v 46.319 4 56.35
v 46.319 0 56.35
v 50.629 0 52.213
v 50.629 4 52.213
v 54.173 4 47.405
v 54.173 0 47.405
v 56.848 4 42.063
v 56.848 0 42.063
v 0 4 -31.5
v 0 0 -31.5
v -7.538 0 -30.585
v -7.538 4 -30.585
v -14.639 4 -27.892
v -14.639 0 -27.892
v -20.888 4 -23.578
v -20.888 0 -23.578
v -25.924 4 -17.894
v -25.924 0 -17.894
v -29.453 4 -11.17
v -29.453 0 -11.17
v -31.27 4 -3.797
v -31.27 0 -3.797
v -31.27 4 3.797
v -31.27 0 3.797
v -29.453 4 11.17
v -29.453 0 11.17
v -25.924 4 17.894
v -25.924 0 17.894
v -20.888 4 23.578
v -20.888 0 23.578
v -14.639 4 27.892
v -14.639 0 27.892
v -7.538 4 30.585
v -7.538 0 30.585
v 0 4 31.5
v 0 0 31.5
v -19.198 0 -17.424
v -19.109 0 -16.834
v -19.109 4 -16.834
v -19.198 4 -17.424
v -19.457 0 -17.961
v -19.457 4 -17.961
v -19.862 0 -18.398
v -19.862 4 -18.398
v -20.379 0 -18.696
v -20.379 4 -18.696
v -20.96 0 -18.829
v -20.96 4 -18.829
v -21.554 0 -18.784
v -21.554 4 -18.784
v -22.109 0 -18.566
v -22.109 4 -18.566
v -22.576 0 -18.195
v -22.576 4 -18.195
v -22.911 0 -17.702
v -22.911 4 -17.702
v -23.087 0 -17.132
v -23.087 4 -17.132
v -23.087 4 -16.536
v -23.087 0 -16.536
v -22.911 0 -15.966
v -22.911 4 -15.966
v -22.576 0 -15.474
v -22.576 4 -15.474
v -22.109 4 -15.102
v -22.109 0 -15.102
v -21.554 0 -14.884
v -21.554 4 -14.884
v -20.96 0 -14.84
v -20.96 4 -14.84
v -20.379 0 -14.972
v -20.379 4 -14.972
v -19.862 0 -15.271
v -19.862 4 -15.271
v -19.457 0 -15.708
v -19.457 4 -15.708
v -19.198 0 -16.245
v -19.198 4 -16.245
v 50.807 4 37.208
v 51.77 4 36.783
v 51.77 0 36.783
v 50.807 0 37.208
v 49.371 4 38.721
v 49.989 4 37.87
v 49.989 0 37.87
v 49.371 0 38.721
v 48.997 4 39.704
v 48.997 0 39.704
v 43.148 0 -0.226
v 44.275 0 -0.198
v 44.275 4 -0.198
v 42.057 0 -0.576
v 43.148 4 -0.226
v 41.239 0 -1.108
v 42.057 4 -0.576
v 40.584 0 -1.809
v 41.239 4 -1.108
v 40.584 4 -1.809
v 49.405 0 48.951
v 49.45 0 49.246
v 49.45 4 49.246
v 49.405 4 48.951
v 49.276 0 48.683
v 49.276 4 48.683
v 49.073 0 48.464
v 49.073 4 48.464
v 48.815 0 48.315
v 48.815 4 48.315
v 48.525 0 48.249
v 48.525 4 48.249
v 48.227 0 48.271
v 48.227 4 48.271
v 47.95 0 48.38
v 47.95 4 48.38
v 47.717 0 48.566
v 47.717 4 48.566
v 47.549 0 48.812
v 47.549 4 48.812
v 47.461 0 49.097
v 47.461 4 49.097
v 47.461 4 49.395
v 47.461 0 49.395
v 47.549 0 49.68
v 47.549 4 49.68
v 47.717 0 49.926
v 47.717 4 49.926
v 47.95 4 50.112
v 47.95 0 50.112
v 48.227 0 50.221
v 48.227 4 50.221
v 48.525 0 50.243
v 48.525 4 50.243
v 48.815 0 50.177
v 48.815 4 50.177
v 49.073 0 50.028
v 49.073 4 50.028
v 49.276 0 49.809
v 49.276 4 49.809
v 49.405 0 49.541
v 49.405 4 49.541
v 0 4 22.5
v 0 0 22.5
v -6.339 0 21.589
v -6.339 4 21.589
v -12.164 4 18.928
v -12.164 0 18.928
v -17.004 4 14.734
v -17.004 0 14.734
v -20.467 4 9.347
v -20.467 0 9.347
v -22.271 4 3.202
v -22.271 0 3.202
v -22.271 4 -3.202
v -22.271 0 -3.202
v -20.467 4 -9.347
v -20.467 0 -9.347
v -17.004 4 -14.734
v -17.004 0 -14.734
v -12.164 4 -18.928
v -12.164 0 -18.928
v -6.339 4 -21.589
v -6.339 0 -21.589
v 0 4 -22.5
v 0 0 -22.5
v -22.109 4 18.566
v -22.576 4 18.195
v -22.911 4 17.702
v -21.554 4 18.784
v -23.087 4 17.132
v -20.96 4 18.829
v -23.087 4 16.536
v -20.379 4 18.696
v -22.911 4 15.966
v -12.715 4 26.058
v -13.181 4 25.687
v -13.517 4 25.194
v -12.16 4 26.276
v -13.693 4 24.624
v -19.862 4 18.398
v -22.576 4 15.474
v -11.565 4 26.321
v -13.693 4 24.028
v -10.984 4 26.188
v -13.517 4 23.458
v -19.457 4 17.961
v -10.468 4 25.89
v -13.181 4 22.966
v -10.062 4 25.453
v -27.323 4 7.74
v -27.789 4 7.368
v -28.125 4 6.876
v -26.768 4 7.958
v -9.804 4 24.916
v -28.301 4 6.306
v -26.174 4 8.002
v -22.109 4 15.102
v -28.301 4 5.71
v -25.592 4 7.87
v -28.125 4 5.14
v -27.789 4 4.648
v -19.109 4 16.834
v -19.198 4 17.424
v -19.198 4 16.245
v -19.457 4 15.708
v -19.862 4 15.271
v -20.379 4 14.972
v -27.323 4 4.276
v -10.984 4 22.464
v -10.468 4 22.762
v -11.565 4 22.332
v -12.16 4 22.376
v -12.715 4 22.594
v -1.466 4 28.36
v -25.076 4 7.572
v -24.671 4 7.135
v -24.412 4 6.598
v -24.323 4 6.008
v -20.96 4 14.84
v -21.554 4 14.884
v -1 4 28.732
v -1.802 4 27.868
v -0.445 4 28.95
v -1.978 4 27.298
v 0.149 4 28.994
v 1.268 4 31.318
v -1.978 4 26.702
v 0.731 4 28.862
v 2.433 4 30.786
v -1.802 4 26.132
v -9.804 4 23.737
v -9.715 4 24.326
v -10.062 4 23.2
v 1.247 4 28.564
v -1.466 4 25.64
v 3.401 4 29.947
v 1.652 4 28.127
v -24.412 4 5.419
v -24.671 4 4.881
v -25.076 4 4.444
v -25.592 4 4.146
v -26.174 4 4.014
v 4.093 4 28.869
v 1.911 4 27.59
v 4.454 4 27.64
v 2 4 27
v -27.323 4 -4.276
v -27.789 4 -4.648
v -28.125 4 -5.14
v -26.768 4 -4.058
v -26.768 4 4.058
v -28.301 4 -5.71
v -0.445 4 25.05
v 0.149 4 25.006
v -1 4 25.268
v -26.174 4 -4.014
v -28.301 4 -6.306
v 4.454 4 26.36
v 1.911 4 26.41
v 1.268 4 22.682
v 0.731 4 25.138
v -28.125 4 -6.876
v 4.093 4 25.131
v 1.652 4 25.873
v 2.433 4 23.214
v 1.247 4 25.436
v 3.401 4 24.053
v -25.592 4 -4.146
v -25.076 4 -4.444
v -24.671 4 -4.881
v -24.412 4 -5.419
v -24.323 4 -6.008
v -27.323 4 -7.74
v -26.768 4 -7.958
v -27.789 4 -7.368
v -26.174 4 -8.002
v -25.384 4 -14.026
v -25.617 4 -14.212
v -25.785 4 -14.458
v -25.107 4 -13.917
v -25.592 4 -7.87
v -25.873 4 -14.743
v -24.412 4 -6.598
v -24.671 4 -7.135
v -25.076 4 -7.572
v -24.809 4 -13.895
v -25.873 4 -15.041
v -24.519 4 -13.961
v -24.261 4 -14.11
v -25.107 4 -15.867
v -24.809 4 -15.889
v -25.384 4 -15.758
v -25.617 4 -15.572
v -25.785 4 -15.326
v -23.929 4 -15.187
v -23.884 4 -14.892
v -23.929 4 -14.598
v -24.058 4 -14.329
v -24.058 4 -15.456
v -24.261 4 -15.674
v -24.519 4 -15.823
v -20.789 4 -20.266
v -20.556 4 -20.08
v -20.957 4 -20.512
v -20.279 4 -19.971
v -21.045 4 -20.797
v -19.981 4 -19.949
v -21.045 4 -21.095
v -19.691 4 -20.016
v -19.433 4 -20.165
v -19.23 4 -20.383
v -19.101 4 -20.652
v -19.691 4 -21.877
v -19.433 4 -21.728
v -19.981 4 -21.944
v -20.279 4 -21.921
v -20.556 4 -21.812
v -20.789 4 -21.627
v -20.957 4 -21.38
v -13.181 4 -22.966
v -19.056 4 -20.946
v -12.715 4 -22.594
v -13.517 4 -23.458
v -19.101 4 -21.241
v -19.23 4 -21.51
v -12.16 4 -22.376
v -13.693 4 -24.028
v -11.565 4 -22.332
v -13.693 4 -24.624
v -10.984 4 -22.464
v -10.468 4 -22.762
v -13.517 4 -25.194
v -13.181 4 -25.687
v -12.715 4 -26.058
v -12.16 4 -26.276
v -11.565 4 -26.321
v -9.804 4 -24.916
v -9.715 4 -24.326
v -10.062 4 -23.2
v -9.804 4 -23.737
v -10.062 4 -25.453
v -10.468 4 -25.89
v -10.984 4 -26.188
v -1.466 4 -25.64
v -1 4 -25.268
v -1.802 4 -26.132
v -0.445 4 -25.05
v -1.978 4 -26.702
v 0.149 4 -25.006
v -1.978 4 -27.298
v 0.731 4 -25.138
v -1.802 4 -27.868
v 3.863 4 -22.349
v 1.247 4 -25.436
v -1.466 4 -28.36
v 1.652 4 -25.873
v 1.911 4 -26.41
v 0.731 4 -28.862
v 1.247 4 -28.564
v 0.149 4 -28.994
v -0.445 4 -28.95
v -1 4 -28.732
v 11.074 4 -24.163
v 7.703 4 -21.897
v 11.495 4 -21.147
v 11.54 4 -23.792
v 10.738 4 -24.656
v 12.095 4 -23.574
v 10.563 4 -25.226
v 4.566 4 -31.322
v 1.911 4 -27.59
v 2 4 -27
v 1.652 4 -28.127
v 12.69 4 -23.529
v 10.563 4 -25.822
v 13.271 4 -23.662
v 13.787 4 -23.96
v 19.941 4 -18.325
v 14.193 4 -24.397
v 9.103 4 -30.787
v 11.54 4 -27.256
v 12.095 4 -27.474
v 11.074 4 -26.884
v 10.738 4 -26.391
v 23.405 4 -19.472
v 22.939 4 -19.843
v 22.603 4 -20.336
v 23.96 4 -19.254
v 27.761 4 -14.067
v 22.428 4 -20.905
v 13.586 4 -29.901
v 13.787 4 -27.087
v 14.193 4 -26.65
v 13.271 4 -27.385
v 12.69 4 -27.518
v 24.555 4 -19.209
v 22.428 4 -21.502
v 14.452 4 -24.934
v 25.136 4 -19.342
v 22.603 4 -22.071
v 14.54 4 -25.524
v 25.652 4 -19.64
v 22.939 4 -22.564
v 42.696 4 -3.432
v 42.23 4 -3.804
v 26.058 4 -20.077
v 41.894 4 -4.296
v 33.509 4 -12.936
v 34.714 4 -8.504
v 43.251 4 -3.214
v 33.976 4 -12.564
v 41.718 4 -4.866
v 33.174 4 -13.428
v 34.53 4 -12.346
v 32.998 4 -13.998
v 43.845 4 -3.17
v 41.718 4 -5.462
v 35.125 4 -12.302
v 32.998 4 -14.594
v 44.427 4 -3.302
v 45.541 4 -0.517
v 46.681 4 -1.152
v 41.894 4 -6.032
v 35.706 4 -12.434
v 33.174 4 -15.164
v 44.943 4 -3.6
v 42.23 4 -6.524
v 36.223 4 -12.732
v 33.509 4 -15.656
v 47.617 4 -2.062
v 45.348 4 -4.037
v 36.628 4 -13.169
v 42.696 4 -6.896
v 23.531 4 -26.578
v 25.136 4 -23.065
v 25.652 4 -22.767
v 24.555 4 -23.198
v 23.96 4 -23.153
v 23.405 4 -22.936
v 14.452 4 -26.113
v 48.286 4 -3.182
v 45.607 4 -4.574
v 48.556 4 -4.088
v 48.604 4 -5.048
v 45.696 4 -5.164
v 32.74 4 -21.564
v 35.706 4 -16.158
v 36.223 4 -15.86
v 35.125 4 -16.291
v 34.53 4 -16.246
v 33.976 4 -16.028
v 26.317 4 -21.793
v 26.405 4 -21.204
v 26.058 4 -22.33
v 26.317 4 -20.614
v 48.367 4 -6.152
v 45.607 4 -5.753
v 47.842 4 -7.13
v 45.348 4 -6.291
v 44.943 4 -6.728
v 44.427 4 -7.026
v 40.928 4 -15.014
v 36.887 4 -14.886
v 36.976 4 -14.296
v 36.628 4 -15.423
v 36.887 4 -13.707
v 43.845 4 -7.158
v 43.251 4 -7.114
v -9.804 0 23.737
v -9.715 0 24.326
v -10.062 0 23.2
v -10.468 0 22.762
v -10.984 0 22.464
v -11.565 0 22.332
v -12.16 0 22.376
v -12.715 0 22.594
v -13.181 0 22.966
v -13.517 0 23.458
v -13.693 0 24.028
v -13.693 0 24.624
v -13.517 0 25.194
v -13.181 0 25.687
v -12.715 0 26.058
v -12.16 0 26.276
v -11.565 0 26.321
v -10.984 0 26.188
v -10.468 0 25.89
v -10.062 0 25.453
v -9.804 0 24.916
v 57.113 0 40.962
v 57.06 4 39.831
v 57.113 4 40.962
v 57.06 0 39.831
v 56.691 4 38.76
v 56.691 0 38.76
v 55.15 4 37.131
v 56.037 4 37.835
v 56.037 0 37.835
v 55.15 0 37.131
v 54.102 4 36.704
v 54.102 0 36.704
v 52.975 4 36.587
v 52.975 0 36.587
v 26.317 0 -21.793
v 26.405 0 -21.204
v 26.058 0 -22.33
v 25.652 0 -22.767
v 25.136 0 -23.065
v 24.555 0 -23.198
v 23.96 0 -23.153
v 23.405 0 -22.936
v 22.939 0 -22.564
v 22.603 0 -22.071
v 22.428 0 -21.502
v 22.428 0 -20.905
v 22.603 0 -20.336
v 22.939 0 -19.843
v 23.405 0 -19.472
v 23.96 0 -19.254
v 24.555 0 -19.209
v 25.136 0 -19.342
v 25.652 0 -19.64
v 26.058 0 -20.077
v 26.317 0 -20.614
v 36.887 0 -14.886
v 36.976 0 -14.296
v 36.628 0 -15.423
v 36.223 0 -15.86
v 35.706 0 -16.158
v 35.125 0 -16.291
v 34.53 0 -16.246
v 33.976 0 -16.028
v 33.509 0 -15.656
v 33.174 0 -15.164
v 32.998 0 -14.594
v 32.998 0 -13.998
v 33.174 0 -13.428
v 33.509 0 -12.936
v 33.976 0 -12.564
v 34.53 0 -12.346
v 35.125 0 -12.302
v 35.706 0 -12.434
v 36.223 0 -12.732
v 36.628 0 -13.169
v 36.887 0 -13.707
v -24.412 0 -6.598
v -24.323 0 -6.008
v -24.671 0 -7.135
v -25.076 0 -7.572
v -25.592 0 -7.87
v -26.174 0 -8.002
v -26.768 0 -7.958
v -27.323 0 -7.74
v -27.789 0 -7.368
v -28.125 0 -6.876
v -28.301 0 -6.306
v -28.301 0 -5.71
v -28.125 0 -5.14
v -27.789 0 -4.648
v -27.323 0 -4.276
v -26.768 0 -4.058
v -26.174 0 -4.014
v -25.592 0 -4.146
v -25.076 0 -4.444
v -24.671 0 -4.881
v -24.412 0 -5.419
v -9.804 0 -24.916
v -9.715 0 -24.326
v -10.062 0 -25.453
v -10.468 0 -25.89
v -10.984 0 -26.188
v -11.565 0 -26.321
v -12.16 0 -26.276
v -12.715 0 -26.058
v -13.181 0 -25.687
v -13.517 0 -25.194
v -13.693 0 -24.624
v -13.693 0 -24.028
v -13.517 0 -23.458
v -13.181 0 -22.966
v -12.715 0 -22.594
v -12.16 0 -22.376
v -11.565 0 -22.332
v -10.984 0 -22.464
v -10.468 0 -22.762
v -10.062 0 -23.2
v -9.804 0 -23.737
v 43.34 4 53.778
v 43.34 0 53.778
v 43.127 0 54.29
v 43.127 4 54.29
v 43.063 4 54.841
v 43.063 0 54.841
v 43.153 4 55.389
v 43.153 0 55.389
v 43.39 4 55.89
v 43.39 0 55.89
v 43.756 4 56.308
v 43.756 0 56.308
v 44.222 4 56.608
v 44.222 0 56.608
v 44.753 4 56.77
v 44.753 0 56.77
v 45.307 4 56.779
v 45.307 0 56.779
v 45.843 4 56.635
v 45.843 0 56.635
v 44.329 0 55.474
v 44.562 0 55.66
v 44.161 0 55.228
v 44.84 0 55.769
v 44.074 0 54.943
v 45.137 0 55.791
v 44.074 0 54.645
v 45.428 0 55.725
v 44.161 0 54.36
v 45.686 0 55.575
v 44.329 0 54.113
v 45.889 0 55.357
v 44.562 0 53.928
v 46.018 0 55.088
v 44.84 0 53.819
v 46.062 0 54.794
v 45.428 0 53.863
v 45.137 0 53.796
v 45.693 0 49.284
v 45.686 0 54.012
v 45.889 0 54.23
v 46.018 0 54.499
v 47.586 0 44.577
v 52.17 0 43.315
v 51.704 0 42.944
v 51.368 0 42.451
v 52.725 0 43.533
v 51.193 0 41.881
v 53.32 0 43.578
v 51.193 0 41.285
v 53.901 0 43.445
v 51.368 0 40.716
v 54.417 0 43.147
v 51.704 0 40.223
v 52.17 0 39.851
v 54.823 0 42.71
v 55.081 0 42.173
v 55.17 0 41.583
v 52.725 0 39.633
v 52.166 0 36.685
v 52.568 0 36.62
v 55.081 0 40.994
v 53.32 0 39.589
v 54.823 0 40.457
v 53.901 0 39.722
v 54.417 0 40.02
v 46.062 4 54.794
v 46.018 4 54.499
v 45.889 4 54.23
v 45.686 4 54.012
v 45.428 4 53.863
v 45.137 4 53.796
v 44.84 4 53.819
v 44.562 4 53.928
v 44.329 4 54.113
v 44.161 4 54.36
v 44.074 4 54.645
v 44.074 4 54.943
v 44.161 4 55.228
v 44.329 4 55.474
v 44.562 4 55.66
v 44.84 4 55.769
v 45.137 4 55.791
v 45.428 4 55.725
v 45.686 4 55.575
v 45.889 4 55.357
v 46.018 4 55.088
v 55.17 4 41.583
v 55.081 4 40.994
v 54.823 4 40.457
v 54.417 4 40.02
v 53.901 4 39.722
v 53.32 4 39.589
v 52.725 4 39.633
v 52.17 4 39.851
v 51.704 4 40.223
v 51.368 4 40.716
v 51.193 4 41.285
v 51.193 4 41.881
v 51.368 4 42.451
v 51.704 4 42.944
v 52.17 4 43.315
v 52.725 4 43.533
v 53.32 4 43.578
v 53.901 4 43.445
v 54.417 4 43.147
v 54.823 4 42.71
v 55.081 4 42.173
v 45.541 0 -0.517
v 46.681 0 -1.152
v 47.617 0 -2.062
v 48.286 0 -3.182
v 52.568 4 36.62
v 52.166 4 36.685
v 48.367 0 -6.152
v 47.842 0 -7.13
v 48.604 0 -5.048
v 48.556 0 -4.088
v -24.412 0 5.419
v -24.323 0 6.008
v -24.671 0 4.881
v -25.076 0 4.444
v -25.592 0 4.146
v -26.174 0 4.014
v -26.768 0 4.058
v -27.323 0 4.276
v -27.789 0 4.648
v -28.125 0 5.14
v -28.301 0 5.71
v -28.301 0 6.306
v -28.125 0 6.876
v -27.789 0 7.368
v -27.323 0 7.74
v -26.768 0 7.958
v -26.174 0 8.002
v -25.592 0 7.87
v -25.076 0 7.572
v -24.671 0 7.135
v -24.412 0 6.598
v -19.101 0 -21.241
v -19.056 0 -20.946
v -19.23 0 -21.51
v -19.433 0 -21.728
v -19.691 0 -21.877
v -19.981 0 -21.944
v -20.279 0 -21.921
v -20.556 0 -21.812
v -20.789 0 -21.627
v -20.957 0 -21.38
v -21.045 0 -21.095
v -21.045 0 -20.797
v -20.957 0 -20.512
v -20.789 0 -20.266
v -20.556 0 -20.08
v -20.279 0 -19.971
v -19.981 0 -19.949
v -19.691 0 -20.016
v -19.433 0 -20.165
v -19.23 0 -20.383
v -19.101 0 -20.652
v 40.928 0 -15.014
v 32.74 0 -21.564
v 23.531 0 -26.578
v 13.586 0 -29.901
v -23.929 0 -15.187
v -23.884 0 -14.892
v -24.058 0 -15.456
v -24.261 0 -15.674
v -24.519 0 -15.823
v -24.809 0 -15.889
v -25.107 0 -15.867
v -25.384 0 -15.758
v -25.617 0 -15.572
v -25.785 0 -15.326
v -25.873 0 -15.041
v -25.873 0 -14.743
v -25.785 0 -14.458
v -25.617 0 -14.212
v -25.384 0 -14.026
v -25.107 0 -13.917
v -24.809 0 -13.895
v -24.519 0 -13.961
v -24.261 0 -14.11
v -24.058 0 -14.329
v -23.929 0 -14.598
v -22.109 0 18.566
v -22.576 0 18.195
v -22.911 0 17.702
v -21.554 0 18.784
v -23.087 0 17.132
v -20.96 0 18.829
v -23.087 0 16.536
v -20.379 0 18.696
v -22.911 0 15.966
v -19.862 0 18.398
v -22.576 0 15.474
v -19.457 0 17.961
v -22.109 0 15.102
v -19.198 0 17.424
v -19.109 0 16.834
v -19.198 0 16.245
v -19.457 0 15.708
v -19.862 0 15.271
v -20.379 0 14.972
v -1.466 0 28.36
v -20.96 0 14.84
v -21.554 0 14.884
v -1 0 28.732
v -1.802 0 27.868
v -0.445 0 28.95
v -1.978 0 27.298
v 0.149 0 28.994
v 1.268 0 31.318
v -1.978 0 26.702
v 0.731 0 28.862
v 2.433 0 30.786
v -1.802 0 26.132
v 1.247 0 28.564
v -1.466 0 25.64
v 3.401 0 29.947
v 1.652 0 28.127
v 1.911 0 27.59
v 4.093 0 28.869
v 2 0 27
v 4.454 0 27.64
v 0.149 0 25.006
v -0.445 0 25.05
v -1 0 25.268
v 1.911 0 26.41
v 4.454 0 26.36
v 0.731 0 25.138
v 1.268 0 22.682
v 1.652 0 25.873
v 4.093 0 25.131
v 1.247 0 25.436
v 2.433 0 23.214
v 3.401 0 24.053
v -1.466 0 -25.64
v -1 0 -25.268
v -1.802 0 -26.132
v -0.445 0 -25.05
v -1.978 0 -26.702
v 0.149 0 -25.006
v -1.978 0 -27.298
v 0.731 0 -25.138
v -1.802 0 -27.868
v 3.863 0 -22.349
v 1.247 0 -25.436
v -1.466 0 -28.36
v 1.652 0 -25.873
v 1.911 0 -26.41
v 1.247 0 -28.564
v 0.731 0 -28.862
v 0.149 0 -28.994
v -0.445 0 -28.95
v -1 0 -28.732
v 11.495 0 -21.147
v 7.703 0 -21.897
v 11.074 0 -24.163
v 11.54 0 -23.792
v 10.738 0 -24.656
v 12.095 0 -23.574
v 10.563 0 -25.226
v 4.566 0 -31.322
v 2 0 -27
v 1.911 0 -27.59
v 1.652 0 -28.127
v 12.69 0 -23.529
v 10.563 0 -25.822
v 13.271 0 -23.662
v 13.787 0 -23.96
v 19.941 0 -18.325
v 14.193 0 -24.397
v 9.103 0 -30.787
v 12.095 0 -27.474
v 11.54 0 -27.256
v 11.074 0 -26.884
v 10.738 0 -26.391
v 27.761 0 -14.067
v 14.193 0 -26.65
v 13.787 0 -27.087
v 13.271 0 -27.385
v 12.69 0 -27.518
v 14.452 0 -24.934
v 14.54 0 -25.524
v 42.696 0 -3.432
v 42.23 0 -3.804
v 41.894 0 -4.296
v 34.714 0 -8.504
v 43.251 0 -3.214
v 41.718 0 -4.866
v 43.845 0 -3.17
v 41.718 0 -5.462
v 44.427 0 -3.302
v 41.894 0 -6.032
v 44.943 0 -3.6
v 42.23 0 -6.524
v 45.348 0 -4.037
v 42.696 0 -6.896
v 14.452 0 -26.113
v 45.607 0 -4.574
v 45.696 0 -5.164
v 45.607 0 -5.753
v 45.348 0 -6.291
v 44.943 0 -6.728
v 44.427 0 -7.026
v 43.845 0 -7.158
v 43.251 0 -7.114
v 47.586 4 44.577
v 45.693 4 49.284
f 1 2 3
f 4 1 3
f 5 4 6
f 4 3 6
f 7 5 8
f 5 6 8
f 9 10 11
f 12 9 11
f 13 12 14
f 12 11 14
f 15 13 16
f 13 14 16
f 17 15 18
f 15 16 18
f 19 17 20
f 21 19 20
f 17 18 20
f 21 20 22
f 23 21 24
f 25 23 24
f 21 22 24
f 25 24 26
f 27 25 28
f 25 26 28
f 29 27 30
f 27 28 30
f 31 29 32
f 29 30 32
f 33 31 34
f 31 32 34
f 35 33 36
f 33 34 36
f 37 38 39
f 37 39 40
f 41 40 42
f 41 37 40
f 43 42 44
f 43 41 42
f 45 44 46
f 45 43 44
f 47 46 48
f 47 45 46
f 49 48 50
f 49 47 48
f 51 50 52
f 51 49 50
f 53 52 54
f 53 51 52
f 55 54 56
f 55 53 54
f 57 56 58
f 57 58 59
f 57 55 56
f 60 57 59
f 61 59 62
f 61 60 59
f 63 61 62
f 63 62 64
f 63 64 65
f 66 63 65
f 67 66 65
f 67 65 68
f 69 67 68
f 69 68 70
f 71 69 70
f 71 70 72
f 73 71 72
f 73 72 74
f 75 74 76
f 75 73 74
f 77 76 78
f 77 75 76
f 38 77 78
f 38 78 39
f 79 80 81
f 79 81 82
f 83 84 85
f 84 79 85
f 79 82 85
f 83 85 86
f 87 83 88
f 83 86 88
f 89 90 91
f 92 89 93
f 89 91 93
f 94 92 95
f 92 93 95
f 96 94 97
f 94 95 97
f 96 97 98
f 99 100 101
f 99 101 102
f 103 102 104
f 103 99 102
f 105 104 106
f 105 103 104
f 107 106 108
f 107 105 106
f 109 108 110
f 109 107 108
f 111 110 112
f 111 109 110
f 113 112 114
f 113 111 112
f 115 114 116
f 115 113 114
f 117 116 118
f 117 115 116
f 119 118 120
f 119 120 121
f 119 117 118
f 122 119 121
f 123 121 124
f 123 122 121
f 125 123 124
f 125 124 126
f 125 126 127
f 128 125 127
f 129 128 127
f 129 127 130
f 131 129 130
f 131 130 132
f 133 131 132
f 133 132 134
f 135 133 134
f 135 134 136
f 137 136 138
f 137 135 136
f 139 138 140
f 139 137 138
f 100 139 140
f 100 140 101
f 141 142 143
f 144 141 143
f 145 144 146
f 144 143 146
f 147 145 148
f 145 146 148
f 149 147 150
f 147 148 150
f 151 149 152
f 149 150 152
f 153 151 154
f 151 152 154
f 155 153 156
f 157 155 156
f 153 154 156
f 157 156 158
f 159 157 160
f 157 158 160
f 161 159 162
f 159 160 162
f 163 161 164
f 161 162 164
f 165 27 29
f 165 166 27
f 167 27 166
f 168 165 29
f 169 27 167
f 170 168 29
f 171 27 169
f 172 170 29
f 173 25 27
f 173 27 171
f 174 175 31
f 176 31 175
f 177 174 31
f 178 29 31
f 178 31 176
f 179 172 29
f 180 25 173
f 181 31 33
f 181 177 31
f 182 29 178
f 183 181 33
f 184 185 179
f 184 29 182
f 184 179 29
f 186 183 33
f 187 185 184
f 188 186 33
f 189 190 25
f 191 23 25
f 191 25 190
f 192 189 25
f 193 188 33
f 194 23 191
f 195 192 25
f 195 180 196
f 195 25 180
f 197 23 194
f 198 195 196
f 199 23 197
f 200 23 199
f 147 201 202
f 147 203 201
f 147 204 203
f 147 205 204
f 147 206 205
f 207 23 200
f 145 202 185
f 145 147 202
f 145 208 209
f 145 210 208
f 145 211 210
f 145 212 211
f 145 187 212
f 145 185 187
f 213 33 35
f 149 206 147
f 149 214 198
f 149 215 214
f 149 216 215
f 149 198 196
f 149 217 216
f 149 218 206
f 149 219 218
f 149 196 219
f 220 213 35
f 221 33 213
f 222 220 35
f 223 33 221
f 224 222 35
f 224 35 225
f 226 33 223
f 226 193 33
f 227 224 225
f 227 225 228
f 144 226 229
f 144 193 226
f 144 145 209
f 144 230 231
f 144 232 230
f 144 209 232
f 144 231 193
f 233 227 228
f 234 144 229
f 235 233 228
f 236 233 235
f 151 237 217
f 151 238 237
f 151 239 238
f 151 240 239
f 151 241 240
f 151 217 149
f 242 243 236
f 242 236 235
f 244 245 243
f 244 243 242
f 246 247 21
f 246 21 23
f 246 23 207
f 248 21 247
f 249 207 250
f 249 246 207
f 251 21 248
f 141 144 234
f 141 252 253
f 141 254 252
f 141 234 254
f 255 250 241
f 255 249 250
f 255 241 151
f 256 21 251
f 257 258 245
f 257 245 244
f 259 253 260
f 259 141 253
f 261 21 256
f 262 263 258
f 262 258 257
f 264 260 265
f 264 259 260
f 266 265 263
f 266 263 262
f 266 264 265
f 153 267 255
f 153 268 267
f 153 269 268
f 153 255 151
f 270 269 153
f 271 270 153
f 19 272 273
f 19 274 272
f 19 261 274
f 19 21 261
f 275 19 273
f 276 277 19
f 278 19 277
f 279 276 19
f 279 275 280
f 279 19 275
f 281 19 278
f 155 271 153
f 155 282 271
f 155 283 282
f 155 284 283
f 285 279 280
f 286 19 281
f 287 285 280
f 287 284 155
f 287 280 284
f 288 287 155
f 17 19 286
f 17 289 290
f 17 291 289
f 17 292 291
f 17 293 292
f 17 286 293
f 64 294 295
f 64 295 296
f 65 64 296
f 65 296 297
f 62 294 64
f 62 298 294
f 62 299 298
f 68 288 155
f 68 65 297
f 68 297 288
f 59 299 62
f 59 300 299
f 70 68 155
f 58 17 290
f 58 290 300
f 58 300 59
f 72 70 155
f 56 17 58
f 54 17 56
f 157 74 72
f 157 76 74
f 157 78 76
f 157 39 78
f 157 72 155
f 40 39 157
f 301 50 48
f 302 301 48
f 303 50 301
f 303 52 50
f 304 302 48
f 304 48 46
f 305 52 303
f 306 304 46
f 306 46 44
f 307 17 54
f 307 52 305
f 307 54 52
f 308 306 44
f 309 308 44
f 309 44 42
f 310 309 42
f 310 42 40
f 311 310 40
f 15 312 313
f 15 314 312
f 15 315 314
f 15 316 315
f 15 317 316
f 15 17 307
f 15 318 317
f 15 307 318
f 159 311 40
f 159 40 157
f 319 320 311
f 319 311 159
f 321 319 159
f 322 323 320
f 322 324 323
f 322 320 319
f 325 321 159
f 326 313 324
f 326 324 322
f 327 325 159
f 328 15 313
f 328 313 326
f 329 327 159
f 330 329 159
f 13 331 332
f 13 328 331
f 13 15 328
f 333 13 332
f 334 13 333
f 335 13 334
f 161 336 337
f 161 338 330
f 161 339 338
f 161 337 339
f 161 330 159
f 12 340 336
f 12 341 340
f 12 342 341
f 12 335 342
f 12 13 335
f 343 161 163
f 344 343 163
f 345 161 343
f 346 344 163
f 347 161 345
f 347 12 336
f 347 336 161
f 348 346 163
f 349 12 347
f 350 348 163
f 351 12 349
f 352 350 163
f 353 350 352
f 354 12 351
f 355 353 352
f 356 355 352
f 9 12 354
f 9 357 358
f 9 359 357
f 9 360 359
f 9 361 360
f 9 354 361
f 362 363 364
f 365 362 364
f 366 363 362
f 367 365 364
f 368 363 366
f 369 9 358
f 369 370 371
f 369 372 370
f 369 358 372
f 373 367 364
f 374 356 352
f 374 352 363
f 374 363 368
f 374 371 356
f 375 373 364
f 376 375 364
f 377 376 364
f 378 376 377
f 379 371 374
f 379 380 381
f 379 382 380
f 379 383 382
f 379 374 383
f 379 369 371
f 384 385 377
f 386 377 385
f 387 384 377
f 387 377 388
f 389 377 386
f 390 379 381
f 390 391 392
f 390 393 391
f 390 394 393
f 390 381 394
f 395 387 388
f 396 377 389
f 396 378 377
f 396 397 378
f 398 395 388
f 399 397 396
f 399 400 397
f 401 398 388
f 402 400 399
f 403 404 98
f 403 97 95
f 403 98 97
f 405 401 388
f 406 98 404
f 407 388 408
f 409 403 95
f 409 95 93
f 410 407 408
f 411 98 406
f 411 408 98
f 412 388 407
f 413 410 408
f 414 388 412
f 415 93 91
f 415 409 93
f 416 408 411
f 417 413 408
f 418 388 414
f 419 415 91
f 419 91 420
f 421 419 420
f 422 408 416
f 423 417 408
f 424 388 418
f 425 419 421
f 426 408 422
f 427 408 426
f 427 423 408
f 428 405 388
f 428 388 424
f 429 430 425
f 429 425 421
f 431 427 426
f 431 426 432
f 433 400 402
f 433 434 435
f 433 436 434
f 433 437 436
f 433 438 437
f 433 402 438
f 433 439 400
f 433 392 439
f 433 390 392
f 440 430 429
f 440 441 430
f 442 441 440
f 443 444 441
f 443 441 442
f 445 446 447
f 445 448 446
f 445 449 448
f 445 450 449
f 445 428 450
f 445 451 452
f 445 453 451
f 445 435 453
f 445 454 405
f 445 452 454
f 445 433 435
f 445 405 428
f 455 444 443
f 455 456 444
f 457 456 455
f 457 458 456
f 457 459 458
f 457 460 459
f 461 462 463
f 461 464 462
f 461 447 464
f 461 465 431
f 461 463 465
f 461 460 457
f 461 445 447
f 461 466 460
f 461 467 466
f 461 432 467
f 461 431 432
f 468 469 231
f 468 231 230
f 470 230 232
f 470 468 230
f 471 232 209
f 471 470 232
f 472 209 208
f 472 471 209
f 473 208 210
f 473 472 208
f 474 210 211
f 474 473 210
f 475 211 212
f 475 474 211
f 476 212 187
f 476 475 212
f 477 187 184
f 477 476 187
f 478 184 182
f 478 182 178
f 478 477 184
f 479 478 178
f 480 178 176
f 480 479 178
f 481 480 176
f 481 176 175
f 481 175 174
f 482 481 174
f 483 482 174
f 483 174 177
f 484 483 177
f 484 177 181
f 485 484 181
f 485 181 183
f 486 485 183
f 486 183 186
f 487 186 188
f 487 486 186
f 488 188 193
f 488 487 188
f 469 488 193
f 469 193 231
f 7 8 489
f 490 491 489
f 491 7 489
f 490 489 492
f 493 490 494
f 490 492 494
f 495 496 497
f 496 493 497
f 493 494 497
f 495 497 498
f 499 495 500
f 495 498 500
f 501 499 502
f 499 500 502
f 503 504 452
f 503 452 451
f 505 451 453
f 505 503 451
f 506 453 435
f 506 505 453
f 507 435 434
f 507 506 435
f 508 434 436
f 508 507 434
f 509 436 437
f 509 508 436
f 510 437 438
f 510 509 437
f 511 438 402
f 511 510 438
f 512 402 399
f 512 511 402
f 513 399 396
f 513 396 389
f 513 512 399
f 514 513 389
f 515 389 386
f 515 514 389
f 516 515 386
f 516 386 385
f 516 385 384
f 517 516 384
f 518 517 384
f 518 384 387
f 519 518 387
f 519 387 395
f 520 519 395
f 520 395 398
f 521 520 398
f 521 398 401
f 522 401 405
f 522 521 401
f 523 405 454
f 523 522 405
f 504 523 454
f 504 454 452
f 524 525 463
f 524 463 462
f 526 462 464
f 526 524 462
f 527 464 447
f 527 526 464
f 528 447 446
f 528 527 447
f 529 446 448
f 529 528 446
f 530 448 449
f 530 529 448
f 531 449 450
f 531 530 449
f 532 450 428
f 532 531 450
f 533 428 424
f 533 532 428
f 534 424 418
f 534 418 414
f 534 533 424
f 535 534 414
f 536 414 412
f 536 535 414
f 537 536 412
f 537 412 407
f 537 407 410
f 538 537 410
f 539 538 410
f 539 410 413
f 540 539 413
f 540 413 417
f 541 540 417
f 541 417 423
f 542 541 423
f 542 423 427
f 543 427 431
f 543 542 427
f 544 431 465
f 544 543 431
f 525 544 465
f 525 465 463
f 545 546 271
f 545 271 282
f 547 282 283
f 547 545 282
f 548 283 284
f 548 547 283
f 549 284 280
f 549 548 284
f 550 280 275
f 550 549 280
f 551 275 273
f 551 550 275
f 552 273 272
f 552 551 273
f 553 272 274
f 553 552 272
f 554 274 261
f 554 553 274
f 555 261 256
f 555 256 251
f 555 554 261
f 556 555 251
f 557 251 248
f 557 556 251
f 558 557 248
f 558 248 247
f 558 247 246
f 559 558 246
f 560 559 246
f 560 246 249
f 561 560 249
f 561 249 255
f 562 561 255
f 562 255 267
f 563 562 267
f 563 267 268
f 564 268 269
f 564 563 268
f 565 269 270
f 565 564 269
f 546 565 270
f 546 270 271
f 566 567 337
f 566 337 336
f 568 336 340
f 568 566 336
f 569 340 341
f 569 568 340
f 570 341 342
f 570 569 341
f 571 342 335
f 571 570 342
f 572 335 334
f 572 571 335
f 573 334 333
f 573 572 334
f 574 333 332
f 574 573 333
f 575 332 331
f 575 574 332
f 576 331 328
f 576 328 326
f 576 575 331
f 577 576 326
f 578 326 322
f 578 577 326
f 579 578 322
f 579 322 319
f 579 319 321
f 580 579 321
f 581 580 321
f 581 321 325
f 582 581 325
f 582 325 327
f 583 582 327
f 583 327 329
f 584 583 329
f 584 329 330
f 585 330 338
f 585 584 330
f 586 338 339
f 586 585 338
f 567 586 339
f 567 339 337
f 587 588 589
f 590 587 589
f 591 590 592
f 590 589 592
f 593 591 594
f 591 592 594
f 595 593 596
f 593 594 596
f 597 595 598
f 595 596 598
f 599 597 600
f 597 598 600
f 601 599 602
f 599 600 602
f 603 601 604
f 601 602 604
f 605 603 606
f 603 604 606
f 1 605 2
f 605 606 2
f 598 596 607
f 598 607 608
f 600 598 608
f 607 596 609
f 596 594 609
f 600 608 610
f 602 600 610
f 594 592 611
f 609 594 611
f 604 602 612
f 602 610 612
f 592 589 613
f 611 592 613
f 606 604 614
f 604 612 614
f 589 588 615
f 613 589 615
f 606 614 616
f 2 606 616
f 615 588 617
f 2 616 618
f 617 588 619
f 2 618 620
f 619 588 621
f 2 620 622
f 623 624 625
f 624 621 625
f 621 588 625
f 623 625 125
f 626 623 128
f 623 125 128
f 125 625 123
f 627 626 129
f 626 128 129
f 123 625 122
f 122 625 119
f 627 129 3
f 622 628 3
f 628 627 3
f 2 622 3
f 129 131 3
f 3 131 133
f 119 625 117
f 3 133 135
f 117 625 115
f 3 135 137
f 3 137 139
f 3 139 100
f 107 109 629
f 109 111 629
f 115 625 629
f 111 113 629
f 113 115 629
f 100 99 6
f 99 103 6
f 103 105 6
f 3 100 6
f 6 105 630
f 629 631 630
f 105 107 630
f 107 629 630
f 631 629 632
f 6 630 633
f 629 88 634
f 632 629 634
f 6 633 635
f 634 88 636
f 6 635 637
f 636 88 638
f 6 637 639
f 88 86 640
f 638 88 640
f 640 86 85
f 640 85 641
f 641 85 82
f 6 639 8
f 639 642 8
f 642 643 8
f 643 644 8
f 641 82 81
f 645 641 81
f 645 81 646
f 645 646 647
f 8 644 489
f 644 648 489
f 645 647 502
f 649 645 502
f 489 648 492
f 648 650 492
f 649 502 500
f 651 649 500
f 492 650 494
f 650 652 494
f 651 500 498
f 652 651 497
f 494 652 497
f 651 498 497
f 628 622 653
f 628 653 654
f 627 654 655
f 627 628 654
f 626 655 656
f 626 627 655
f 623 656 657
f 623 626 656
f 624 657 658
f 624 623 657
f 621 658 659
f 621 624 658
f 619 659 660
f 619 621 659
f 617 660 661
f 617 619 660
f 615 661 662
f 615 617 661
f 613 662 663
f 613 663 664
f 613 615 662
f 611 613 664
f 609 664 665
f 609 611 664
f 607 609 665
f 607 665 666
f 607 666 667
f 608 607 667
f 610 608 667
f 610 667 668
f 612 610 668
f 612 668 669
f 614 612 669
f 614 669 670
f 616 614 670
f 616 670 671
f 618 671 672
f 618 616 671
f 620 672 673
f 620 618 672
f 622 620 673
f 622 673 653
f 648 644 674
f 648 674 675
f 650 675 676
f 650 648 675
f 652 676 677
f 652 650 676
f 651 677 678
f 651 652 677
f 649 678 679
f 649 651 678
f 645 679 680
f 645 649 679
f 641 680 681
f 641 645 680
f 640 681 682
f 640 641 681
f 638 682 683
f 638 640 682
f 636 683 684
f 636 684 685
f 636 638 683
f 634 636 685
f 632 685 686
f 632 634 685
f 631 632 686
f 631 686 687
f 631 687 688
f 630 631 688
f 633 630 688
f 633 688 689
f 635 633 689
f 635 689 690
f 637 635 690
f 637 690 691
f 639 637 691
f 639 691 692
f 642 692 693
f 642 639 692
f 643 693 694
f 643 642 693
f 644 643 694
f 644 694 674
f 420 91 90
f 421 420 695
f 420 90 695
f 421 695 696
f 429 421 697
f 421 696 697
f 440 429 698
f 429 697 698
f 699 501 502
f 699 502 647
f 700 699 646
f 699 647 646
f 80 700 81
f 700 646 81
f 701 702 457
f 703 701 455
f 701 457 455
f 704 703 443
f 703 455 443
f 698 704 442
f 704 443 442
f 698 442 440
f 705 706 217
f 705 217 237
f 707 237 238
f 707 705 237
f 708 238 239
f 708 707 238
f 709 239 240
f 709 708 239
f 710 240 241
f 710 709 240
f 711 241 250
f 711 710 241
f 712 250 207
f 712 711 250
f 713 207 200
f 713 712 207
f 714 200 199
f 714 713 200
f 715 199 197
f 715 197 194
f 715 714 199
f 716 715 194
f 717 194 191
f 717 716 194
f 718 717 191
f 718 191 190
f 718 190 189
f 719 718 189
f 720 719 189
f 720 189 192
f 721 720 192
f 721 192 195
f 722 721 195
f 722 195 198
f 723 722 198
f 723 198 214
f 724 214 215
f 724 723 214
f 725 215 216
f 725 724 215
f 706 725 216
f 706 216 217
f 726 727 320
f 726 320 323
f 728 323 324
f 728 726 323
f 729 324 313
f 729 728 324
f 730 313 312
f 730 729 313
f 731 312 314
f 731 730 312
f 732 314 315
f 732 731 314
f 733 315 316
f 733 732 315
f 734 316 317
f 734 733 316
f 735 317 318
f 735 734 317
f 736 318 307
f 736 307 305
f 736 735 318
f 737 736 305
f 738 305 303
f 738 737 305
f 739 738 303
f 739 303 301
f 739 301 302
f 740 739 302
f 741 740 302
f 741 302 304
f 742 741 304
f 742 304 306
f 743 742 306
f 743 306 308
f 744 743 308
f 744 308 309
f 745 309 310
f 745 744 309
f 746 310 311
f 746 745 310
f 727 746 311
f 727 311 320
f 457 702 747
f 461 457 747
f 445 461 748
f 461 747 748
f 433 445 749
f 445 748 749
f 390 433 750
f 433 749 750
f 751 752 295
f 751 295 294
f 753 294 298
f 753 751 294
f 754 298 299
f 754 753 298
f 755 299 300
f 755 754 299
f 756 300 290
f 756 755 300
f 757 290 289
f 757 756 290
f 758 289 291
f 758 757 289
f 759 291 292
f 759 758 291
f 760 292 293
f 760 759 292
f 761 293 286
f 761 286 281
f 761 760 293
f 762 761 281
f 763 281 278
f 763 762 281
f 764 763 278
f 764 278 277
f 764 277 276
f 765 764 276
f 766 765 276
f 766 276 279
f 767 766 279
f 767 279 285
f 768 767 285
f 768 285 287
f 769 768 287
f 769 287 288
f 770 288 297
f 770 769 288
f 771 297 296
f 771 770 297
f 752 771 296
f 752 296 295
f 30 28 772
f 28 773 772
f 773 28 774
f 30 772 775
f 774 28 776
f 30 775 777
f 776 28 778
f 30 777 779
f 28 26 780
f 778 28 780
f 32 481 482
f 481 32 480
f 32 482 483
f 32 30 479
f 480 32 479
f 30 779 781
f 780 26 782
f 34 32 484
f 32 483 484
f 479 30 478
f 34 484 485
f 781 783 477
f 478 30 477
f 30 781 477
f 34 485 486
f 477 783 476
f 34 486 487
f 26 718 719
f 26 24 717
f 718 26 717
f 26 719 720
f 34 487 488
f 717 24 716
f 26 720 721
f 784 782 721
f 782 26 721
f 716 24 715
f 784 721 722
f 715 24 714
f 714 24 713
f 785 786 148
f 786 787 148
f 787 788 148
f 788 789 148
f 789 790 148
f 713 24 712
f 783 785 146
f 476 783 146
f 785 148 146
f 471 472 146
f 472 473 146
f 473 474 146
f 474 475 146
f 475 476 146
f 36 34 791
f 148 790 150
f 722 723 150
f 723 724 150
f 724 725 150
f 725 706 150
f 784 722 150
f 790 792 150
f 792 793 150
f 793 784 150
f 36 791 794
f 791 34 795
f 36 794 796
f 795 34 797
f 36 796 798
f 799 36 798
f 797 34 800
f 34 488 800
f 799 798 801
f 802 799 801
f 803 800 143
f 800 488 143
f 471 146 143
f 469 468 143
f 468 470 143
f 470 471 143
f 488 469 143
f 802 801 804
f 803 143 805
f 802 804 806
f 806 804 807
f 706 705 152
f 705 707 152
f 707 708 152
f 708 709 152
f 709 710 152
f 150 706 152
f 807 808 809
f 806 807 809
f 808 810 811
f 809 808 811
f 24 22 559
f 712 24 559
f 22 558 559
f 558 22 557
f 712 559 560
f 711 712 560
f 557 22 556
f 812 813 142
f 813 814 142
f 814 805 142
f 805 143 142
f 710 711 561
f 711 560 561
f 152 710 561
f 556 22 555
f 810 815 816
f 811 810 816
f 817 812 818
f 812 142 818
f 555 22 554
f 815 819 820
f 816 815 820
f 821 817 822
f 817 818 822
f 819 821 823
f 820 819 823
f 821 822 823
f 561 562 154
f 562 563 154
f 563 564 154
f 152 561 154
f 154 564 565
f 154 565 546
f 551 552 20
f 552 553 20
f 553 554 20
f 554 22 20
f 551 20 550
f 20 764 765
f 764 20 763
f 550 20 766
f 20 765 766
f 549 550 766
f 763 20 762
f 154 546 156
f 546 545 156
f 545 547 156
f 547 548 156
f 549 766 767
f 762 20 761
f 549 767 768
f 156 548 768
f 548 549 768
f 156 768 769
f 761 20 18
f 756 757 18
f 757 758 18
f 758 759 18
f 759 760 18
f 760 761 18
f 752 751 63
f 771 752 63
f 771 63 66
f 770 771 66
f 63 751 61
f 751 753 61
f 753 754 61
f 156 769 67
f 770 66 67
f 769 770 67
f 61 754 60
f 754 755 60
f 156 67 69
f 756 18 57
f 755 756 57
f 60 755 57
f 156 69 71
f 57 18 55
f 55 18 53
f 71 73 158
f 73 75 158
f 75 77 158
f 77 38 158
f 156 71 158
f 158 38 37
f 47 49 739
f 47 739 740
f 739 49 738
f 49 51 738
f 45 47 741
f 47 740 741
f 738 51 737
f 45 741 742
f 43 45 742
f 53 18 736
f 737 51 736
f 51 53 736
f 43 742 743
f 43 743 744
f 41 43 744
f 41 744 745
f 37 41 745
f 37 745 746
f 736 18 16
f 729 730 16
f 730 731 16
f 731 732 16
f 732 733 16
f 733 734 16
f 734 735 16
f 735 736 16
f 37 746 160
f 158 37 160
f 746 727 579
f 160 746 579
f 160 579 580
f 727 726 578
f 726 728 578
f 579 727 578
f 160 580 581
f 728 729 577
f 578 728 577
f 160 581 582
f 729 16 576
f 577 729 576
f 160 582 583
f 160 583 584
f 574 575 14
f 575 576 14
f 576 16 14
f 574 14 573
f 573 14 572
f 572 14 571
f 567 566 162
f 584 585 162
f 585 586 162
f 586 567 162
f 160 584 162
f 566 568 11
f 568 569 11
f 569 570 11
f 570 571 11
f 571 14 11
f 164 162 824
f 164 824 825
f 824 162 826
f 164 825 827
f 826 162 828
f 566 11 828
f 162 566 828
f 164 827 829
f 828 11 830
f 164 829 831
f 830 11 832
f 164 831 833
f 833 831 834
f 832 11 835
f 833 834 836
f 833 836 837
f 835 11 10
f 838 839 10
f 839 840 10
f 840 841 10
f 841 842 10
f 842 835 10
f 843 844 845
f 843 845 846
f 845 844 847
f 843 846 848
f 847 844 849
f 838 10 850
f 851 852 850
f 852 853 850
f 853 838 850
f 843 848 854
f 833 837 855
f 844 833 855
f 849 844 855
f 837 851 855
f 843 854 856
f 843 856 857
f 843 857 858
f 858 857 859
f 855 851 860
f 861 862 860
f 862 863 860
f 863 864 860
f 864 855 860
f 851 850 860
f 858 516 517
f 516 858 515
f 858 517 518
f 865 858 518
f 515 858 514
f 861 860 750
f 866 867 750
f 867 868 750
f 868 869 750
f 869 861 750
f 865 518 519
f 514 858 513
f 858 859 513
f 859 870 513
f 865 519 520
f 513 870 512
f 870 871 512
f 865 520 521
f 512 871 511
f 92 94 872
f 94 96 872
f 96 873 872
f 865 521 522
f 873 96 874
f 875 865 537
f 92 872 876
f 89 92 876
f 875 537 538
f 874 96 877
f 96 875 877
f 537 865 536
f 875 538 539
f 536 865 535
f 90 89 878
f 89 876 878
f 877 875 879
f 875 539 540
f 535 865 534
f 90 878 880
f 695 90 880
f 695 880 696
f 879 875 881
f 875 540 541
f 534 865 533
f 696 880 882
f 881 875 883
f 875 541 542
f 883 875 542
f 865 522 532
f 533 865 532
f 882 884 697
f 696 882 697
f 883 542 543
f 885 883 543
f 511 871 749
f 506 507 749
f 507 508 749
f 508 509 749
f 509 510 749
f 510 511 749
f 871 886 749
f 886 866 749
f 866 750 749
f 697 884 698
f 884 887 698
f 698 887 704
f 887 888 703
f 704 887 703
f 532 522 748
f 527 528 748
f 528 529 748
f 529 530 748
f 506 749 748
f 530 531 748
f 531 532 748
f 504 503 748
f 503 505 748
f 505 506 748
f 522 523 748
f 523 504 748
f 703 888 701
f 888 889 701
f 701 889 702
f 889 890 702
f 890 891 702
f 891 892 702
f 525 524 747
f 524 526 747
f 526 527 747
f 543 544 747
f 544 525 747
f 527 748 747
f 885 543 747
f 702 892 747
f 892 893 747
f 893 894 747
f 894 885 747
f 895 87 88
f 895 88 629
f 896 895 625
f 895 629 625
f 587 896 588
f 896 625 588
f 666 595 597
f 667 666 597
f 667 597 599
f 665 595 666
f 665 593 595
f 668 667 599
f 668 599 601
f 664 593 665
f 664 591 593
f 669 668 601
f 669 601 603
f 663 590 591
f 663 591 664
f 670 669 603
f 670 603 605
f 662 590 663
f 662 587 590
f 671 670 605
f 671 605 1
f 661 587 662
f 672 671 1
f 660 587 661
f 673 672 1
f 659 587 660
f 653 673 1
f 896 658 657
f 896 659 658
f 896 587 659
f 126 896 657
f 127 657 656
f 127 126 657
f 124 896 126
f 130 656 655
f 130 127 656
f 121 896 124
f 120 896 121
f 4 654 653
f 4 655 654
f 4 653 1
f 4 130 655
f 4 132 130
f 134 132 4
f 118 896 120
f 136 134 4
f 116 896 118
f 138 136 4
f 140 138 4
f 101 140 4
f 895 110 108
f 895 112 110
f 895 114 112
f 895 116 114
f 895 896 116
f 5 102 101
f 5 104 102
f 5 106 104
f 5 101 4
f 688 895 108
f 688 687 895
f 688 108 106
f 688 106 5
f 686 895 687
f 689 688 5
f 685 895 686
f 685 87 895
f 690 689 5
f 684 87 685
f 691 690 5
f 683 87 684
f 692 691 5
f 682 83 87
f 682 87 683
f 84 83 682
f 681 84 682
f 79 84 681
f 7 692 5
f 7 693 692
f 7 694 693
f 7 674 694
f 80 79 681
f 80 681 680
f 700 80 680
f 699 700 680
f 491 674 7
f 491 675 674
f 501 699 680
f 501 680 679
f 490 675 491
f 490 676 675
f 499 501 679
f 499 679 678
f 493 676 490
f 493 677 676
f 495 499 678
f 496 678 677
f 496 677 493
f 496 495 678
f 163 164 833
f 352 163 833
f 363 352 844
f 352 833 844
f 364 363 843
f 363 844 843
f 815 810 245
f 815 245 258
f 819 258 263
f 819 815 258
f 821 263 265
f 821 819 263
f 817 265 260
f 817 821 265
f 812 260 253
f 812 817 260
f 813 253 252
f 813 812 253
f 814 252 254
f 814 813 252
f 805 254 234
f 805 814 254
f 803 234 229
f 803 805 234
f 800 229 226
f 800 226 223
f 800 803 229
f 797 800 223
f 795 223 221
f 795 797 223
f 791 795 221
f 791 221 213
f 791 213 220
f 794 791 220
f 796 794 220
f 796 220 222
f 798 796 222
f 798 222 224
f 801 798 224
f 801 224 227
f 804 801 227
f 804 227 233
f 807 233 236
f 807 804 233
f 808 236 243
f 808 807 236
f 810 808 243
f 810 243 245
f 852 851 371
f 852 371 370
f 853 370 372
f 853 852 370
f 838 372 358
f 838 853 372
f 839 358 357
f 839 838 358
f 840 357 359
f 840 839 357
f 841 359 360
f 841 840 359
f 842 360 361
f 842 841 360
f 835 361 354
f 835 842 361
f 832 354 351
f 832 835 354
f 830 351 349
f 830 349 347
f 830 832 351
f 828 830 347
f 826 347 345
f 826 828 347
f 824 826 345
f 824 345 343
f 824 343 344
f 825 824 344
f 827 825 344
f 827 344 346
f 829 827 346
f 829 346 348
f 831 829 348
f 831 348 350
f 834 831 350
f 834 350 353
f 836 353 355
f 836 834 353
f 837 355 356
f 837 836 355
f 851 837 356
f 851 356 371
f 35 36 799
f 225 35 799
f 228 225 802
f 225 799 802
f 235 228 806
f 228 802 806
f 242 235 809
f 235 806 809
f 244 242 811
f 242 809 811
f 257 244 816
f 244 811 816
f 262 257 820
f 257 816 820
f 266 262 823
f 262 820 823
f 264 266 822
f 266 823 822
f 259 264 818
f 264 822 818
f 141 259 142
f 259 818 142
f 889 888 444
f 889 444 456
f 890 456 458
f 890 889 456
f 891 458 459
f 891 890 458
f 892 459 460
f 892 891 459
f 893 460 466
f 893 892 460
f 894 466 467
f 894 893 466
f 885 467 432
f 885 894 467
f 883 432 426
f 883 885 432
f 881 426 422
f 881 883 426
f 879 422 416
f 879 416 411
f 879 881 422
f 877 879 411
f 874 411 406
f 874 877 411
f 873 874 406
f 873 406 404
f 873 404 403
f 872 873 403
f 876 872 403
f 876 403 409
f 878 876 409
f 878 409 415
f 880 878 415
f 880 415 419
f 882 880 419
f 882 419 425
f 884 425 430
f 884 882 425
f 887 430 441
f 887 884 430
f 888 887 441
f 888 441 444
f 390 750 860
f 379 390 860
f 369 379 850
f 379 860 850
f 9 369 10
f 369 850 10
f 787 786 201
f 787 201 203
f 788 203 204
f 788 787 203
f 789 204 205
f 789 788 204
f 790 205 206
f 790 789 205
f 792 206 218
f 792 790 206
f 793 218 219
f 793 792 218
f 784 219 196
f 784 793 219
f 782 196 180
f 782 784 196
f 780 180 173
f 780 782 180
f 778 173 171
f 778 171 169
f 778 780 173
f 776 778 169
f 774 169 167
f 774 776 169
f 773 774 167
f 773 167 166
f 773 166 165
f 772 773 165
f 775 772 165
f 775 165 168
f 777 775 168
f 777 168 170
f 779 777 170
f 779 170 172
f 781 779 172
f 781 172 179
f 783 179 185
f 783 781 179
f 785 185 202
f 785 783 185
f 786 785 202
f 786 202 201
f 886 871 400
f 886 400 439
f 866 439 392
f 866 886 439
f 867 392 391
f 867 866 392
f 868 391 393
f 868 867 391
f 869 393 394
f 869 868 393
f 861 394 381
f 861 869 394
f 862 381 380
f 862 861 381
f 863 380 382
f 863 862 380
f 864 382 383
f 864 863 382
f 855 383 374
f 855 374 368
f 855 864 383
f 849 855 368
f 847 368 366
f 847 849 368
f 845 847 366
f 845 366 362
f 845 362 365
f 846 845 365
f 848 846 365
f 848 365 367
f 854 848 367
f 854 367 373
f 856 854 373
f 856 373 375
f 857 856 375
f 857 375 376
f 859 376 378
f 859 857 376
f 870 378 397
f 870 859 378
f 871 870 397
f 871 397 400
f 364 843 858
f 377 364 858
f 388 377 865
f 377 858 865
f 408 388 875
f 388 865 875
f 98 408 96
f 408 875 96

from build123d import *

# Parameters (mm, degrees)
EXTRUDE_2_OUTLINE_R   = 2
EXTRUDE_2_OUTLINE_R_2 = 1
EXTRUDE_2_DEPTH       = 4
CUT_EXTRUDE_START     = -10
CUT_EXTRUDE_3_DEPTH   = 10
FILLET_1_R            = 4
FILLET_2_R            = 4


with BuildPart() as part:
    # 凸台-拉伸2: read off the stored shape, not the designer's step
    # 凸台-拉伸2 outline → 凸台-拉伸2 (new body)
    with BuildSketch(Plane(origin=(0, 0, 0), x_dir=(1, 0, 0), z_dir=(0, 1, 0))):
        with BuildLine():
            ThreePointArc((0, -31.5), (4.5, -27), (0, -22.5))
            ThreePointArc((0, -22.5), (-22.5, 3.7e-08), (7.4e-08, 22.5))
            ThreePointArc((7.4e-08, 22.5), (5.787375943, 22.160515492), (11.49536899, 21.146718391))
            ThreePointArc((11.49536899, 21.146718391), (46.318634446, -8.282336699), (43.339524989, -53.777984924))
            ThreePointArc((43.339524989, -53.777984924), (43.755673323, -56.307687994), (46.319034695, -56.349587119))
            ThreePointArc((46.319034695, -56.349587119), (55.582439452, -44.874948294), (59.297272191, -30.603367387))
            ThreePointArc((59.297272191, -30.603367387), (47.302958929, 7.854702908), (13.58555366, 29.900639116))
            ThreePointArc((13.58555366, 29.900639116), (6.839686095, 31.09878393), (0, 31.5))
            ThreePointArc((0, 31.5), (-31.5, 0), (0, -31.5))
        make_face()
        with Locations((-11.714860956, -24.326159433)):
            Circle(EXTRUDE_2_OUTLINE_R, mode=Mode.SUBTRACT)
        with Locations((-21.109450027, -16.83422465)):
            Circle(EXTRUDE_2_OUTLINE_R, mode=Mode.SUBTRACT)
        with Locations((0, -27)):
            Circle(EXTRUDE_2_OUTLINE_R, mode=Mode.SUBTRACT)
        with Locations((45.062444179, -54.793637159)):
            Circle(EXTRUDE_2_OUTLINE_R_2, mode=Mode.SUBTRACT)
        with Locations((48.449771136, -49.246023611)):
            Circle(EXTRUDE_2_OUTLINE_R_2, mode=Mode.SUBTRACT)
        with Locations((53.170264587, -41.583325549)):
            Circle(EXTRUDE_2_OUTLINE_R, mode=Mode.SUBTRACT)
        with Locations((54.835170241, -29.39015795)):
            Circle(EXTRUDE_2_OUTLINE_R, mode=Mode.SUBTRACT)
        with Locations((53.752708813, -17.131547744)):
            Circle(EXTRUDE_2_OUTLINE_R, mode=Mode.SUBTRACT)
        with Locations((-26.323053629, -6.008065217)):
            Circle(EXTRUDE_2_OUTLINE_R, mode=Mode.SUBTRACT)
        with Locations((-26.323053629, 6.008065217)):
            Circle(EXTRUDE_2_OUTLINE_R, mode=Mode.SUBTRACT)
        with Locations((-24.884124338, 14.892291829)):
            Circle(EXTRUDE_2_OUTLINE_R_2, mode=Mode.SUBTRACT)
        with Locations((-21.109450027, 16.83422465)):
            Circle(EXTRUDE_2_OUTLINE_R, mode=Mode.SUBTRACT)
        with Locations((-20.056149569, 20.946380701)):
            Circle(EXTRUDE_2_OUTLINE_R_2, mode=Mode.SUBTRACT)
        with Locations((-11.714860956, 24.326159433)):
            Circle(EXTRUDE_2_OUTLINE_R, mode=Mode.SUBTRACT)
        with Locations((0, 27)):
            Circle(EXTRUDE_2_OUTLINE_R, mode=Mode.SUBTRACT)
        with Locations((12.540402592, 25.523692776)):
            Circle(EXTRUDE_2_OUTLINE_R, mode=Mode.SUBTRACT)
        with Locations((49.976860752, -5.418810304)):
            Circle(EXTRUDE_2_OUTLINE_R, mode=Mode.SUBTRACT)
        with Locations((43.695920975, 5.163960715)):
            Circle(EXTRUDE_2_OUTLINE_R, mode=Mode.SUBTRACT)
        with Locations((34.975533575, 14.296103059)):
            Circle(EXTRUDE_2_OUTLINE_R, mode=Mode.SUBTRACT)
        with Locations((24.405378973, 21.203563653)):
            Circle(EXTRUDE_2_OUTLINE_R, mode=Mode.SUBTRACT)
    extrude(amount=EXTRUDE_2_DEPTH)

    # 草图8 → 切除-拉伸3 (cut)
    with BuildSketch(Plane(origin=(0, 4, 0), x_dir=(1, 0, 0), z_dir=(0, 1, 0)).offset(CUT_EXTRUDE_START)):
        with BuildLine():
            ThreePointArc((41.332007484, 0.758065459), (46.632458464, 1.117141276), (48.617709435, 6.044868402))
            ThreePointArc((48.617709435, 6.044868402), (56.970460411, -11.401248213), (59.297272191, -30.603367387))
            ThreePointArc((59.297272191, -30.603367387), (58.809304177, -35.127790179), (57.738444676, -39.550659644))
            ThreePointArc((57.738444676, -39.550659644), (53.817860097, -36.625440914), (49.277451804, -38.445490526))
            ThreePointArc((49.277451804, -38.445490526), (49.342376142, -18.025396576), (41.332007484, 0.758065459))
        make_face()
    extrude(amount=CUT_EXTRUDE_3_DEPTH, mode=Mode.SUBTRACT)


with BuildPart() as cut_extrude_3_piece_1:
    # of the separate pieces the step leaves, piece 1, a body of its own (cut_extrude_3_pieces)
    add(part.part.solids().sort_by_distance((0, 0, -31.5))[0])

    # 圆角1
    fillet_1_edges = [cut_extrude_3_piece_1.edges().sort_by_distance(p)[0] for p in [
        (48.617709435, 2, -6.044868402),
        (41.332007484, 2, -0.758065459),
    ]]
    fillet(fillet_1_edges, radius=FILLET_1_R)


with BuildPart() as cut_extrude_3_piece_2:
    # of the separate pieces the step leaves, piece 2, a body of its own (cut_extrude_3_pieces)
    add(part.part.solids().sort_by_distance((46.319034695, 0, 56.349587119))[0])

    # 圆角2
    # the kernel refuses this fillet: 4 mm, written as the material it takes off along each edge
    with BuildSketch(Plane(origin=(57.738444676, -14.025049708, 39.550659644), x_dir=(-0.3341423886783104, 0, 0.942522606672303), z_dir=(0, 1, 0))) as fillet_2_piece_1:
        with BuildLine():
            CenterArc((2.513497567, -3.997098273), FILLET_2_R, 87.817460056, 113.940415857)
            ThreePointArc((-1.201536862, -5.479838708), (-1.441718234, -2.555528491), (0, 0))
            ThreePointArc((0, 0), (1.332915376, 0.025390115), (2.665830753, 0))
        make_face()
    extrude(amount=32.050099416, mode=Mode.SUBTRACT)
    with BuildSketch(Plane(origin=(49.277451804, -7.489347392, 38.445490526), x_dir=(-0.21731663621924255, 0, 0.9761011625965585), z_dir=(0, 1, 0))) as fillet_2_piece_2:
        with BuildLine():
            CenterArc((1.340704391, 3.999675251), FILLET_2_R, 208.816602823, 60.45329366)
            ThreePointArc((-2.163963783, 2.071644912), (-1.240781155, 0.869946609), (0, 0))
            ThreePointArc((0, 0), (0.644867465, 0.004108735), (1.28973493, 0))
        make_face()
    extrude(amount=18.978694783, mode=Mode.SUBTRACT)


solid = Compound([cut_extrude_3_piece_1.part, cut_extrude_3_piece_2.part])
